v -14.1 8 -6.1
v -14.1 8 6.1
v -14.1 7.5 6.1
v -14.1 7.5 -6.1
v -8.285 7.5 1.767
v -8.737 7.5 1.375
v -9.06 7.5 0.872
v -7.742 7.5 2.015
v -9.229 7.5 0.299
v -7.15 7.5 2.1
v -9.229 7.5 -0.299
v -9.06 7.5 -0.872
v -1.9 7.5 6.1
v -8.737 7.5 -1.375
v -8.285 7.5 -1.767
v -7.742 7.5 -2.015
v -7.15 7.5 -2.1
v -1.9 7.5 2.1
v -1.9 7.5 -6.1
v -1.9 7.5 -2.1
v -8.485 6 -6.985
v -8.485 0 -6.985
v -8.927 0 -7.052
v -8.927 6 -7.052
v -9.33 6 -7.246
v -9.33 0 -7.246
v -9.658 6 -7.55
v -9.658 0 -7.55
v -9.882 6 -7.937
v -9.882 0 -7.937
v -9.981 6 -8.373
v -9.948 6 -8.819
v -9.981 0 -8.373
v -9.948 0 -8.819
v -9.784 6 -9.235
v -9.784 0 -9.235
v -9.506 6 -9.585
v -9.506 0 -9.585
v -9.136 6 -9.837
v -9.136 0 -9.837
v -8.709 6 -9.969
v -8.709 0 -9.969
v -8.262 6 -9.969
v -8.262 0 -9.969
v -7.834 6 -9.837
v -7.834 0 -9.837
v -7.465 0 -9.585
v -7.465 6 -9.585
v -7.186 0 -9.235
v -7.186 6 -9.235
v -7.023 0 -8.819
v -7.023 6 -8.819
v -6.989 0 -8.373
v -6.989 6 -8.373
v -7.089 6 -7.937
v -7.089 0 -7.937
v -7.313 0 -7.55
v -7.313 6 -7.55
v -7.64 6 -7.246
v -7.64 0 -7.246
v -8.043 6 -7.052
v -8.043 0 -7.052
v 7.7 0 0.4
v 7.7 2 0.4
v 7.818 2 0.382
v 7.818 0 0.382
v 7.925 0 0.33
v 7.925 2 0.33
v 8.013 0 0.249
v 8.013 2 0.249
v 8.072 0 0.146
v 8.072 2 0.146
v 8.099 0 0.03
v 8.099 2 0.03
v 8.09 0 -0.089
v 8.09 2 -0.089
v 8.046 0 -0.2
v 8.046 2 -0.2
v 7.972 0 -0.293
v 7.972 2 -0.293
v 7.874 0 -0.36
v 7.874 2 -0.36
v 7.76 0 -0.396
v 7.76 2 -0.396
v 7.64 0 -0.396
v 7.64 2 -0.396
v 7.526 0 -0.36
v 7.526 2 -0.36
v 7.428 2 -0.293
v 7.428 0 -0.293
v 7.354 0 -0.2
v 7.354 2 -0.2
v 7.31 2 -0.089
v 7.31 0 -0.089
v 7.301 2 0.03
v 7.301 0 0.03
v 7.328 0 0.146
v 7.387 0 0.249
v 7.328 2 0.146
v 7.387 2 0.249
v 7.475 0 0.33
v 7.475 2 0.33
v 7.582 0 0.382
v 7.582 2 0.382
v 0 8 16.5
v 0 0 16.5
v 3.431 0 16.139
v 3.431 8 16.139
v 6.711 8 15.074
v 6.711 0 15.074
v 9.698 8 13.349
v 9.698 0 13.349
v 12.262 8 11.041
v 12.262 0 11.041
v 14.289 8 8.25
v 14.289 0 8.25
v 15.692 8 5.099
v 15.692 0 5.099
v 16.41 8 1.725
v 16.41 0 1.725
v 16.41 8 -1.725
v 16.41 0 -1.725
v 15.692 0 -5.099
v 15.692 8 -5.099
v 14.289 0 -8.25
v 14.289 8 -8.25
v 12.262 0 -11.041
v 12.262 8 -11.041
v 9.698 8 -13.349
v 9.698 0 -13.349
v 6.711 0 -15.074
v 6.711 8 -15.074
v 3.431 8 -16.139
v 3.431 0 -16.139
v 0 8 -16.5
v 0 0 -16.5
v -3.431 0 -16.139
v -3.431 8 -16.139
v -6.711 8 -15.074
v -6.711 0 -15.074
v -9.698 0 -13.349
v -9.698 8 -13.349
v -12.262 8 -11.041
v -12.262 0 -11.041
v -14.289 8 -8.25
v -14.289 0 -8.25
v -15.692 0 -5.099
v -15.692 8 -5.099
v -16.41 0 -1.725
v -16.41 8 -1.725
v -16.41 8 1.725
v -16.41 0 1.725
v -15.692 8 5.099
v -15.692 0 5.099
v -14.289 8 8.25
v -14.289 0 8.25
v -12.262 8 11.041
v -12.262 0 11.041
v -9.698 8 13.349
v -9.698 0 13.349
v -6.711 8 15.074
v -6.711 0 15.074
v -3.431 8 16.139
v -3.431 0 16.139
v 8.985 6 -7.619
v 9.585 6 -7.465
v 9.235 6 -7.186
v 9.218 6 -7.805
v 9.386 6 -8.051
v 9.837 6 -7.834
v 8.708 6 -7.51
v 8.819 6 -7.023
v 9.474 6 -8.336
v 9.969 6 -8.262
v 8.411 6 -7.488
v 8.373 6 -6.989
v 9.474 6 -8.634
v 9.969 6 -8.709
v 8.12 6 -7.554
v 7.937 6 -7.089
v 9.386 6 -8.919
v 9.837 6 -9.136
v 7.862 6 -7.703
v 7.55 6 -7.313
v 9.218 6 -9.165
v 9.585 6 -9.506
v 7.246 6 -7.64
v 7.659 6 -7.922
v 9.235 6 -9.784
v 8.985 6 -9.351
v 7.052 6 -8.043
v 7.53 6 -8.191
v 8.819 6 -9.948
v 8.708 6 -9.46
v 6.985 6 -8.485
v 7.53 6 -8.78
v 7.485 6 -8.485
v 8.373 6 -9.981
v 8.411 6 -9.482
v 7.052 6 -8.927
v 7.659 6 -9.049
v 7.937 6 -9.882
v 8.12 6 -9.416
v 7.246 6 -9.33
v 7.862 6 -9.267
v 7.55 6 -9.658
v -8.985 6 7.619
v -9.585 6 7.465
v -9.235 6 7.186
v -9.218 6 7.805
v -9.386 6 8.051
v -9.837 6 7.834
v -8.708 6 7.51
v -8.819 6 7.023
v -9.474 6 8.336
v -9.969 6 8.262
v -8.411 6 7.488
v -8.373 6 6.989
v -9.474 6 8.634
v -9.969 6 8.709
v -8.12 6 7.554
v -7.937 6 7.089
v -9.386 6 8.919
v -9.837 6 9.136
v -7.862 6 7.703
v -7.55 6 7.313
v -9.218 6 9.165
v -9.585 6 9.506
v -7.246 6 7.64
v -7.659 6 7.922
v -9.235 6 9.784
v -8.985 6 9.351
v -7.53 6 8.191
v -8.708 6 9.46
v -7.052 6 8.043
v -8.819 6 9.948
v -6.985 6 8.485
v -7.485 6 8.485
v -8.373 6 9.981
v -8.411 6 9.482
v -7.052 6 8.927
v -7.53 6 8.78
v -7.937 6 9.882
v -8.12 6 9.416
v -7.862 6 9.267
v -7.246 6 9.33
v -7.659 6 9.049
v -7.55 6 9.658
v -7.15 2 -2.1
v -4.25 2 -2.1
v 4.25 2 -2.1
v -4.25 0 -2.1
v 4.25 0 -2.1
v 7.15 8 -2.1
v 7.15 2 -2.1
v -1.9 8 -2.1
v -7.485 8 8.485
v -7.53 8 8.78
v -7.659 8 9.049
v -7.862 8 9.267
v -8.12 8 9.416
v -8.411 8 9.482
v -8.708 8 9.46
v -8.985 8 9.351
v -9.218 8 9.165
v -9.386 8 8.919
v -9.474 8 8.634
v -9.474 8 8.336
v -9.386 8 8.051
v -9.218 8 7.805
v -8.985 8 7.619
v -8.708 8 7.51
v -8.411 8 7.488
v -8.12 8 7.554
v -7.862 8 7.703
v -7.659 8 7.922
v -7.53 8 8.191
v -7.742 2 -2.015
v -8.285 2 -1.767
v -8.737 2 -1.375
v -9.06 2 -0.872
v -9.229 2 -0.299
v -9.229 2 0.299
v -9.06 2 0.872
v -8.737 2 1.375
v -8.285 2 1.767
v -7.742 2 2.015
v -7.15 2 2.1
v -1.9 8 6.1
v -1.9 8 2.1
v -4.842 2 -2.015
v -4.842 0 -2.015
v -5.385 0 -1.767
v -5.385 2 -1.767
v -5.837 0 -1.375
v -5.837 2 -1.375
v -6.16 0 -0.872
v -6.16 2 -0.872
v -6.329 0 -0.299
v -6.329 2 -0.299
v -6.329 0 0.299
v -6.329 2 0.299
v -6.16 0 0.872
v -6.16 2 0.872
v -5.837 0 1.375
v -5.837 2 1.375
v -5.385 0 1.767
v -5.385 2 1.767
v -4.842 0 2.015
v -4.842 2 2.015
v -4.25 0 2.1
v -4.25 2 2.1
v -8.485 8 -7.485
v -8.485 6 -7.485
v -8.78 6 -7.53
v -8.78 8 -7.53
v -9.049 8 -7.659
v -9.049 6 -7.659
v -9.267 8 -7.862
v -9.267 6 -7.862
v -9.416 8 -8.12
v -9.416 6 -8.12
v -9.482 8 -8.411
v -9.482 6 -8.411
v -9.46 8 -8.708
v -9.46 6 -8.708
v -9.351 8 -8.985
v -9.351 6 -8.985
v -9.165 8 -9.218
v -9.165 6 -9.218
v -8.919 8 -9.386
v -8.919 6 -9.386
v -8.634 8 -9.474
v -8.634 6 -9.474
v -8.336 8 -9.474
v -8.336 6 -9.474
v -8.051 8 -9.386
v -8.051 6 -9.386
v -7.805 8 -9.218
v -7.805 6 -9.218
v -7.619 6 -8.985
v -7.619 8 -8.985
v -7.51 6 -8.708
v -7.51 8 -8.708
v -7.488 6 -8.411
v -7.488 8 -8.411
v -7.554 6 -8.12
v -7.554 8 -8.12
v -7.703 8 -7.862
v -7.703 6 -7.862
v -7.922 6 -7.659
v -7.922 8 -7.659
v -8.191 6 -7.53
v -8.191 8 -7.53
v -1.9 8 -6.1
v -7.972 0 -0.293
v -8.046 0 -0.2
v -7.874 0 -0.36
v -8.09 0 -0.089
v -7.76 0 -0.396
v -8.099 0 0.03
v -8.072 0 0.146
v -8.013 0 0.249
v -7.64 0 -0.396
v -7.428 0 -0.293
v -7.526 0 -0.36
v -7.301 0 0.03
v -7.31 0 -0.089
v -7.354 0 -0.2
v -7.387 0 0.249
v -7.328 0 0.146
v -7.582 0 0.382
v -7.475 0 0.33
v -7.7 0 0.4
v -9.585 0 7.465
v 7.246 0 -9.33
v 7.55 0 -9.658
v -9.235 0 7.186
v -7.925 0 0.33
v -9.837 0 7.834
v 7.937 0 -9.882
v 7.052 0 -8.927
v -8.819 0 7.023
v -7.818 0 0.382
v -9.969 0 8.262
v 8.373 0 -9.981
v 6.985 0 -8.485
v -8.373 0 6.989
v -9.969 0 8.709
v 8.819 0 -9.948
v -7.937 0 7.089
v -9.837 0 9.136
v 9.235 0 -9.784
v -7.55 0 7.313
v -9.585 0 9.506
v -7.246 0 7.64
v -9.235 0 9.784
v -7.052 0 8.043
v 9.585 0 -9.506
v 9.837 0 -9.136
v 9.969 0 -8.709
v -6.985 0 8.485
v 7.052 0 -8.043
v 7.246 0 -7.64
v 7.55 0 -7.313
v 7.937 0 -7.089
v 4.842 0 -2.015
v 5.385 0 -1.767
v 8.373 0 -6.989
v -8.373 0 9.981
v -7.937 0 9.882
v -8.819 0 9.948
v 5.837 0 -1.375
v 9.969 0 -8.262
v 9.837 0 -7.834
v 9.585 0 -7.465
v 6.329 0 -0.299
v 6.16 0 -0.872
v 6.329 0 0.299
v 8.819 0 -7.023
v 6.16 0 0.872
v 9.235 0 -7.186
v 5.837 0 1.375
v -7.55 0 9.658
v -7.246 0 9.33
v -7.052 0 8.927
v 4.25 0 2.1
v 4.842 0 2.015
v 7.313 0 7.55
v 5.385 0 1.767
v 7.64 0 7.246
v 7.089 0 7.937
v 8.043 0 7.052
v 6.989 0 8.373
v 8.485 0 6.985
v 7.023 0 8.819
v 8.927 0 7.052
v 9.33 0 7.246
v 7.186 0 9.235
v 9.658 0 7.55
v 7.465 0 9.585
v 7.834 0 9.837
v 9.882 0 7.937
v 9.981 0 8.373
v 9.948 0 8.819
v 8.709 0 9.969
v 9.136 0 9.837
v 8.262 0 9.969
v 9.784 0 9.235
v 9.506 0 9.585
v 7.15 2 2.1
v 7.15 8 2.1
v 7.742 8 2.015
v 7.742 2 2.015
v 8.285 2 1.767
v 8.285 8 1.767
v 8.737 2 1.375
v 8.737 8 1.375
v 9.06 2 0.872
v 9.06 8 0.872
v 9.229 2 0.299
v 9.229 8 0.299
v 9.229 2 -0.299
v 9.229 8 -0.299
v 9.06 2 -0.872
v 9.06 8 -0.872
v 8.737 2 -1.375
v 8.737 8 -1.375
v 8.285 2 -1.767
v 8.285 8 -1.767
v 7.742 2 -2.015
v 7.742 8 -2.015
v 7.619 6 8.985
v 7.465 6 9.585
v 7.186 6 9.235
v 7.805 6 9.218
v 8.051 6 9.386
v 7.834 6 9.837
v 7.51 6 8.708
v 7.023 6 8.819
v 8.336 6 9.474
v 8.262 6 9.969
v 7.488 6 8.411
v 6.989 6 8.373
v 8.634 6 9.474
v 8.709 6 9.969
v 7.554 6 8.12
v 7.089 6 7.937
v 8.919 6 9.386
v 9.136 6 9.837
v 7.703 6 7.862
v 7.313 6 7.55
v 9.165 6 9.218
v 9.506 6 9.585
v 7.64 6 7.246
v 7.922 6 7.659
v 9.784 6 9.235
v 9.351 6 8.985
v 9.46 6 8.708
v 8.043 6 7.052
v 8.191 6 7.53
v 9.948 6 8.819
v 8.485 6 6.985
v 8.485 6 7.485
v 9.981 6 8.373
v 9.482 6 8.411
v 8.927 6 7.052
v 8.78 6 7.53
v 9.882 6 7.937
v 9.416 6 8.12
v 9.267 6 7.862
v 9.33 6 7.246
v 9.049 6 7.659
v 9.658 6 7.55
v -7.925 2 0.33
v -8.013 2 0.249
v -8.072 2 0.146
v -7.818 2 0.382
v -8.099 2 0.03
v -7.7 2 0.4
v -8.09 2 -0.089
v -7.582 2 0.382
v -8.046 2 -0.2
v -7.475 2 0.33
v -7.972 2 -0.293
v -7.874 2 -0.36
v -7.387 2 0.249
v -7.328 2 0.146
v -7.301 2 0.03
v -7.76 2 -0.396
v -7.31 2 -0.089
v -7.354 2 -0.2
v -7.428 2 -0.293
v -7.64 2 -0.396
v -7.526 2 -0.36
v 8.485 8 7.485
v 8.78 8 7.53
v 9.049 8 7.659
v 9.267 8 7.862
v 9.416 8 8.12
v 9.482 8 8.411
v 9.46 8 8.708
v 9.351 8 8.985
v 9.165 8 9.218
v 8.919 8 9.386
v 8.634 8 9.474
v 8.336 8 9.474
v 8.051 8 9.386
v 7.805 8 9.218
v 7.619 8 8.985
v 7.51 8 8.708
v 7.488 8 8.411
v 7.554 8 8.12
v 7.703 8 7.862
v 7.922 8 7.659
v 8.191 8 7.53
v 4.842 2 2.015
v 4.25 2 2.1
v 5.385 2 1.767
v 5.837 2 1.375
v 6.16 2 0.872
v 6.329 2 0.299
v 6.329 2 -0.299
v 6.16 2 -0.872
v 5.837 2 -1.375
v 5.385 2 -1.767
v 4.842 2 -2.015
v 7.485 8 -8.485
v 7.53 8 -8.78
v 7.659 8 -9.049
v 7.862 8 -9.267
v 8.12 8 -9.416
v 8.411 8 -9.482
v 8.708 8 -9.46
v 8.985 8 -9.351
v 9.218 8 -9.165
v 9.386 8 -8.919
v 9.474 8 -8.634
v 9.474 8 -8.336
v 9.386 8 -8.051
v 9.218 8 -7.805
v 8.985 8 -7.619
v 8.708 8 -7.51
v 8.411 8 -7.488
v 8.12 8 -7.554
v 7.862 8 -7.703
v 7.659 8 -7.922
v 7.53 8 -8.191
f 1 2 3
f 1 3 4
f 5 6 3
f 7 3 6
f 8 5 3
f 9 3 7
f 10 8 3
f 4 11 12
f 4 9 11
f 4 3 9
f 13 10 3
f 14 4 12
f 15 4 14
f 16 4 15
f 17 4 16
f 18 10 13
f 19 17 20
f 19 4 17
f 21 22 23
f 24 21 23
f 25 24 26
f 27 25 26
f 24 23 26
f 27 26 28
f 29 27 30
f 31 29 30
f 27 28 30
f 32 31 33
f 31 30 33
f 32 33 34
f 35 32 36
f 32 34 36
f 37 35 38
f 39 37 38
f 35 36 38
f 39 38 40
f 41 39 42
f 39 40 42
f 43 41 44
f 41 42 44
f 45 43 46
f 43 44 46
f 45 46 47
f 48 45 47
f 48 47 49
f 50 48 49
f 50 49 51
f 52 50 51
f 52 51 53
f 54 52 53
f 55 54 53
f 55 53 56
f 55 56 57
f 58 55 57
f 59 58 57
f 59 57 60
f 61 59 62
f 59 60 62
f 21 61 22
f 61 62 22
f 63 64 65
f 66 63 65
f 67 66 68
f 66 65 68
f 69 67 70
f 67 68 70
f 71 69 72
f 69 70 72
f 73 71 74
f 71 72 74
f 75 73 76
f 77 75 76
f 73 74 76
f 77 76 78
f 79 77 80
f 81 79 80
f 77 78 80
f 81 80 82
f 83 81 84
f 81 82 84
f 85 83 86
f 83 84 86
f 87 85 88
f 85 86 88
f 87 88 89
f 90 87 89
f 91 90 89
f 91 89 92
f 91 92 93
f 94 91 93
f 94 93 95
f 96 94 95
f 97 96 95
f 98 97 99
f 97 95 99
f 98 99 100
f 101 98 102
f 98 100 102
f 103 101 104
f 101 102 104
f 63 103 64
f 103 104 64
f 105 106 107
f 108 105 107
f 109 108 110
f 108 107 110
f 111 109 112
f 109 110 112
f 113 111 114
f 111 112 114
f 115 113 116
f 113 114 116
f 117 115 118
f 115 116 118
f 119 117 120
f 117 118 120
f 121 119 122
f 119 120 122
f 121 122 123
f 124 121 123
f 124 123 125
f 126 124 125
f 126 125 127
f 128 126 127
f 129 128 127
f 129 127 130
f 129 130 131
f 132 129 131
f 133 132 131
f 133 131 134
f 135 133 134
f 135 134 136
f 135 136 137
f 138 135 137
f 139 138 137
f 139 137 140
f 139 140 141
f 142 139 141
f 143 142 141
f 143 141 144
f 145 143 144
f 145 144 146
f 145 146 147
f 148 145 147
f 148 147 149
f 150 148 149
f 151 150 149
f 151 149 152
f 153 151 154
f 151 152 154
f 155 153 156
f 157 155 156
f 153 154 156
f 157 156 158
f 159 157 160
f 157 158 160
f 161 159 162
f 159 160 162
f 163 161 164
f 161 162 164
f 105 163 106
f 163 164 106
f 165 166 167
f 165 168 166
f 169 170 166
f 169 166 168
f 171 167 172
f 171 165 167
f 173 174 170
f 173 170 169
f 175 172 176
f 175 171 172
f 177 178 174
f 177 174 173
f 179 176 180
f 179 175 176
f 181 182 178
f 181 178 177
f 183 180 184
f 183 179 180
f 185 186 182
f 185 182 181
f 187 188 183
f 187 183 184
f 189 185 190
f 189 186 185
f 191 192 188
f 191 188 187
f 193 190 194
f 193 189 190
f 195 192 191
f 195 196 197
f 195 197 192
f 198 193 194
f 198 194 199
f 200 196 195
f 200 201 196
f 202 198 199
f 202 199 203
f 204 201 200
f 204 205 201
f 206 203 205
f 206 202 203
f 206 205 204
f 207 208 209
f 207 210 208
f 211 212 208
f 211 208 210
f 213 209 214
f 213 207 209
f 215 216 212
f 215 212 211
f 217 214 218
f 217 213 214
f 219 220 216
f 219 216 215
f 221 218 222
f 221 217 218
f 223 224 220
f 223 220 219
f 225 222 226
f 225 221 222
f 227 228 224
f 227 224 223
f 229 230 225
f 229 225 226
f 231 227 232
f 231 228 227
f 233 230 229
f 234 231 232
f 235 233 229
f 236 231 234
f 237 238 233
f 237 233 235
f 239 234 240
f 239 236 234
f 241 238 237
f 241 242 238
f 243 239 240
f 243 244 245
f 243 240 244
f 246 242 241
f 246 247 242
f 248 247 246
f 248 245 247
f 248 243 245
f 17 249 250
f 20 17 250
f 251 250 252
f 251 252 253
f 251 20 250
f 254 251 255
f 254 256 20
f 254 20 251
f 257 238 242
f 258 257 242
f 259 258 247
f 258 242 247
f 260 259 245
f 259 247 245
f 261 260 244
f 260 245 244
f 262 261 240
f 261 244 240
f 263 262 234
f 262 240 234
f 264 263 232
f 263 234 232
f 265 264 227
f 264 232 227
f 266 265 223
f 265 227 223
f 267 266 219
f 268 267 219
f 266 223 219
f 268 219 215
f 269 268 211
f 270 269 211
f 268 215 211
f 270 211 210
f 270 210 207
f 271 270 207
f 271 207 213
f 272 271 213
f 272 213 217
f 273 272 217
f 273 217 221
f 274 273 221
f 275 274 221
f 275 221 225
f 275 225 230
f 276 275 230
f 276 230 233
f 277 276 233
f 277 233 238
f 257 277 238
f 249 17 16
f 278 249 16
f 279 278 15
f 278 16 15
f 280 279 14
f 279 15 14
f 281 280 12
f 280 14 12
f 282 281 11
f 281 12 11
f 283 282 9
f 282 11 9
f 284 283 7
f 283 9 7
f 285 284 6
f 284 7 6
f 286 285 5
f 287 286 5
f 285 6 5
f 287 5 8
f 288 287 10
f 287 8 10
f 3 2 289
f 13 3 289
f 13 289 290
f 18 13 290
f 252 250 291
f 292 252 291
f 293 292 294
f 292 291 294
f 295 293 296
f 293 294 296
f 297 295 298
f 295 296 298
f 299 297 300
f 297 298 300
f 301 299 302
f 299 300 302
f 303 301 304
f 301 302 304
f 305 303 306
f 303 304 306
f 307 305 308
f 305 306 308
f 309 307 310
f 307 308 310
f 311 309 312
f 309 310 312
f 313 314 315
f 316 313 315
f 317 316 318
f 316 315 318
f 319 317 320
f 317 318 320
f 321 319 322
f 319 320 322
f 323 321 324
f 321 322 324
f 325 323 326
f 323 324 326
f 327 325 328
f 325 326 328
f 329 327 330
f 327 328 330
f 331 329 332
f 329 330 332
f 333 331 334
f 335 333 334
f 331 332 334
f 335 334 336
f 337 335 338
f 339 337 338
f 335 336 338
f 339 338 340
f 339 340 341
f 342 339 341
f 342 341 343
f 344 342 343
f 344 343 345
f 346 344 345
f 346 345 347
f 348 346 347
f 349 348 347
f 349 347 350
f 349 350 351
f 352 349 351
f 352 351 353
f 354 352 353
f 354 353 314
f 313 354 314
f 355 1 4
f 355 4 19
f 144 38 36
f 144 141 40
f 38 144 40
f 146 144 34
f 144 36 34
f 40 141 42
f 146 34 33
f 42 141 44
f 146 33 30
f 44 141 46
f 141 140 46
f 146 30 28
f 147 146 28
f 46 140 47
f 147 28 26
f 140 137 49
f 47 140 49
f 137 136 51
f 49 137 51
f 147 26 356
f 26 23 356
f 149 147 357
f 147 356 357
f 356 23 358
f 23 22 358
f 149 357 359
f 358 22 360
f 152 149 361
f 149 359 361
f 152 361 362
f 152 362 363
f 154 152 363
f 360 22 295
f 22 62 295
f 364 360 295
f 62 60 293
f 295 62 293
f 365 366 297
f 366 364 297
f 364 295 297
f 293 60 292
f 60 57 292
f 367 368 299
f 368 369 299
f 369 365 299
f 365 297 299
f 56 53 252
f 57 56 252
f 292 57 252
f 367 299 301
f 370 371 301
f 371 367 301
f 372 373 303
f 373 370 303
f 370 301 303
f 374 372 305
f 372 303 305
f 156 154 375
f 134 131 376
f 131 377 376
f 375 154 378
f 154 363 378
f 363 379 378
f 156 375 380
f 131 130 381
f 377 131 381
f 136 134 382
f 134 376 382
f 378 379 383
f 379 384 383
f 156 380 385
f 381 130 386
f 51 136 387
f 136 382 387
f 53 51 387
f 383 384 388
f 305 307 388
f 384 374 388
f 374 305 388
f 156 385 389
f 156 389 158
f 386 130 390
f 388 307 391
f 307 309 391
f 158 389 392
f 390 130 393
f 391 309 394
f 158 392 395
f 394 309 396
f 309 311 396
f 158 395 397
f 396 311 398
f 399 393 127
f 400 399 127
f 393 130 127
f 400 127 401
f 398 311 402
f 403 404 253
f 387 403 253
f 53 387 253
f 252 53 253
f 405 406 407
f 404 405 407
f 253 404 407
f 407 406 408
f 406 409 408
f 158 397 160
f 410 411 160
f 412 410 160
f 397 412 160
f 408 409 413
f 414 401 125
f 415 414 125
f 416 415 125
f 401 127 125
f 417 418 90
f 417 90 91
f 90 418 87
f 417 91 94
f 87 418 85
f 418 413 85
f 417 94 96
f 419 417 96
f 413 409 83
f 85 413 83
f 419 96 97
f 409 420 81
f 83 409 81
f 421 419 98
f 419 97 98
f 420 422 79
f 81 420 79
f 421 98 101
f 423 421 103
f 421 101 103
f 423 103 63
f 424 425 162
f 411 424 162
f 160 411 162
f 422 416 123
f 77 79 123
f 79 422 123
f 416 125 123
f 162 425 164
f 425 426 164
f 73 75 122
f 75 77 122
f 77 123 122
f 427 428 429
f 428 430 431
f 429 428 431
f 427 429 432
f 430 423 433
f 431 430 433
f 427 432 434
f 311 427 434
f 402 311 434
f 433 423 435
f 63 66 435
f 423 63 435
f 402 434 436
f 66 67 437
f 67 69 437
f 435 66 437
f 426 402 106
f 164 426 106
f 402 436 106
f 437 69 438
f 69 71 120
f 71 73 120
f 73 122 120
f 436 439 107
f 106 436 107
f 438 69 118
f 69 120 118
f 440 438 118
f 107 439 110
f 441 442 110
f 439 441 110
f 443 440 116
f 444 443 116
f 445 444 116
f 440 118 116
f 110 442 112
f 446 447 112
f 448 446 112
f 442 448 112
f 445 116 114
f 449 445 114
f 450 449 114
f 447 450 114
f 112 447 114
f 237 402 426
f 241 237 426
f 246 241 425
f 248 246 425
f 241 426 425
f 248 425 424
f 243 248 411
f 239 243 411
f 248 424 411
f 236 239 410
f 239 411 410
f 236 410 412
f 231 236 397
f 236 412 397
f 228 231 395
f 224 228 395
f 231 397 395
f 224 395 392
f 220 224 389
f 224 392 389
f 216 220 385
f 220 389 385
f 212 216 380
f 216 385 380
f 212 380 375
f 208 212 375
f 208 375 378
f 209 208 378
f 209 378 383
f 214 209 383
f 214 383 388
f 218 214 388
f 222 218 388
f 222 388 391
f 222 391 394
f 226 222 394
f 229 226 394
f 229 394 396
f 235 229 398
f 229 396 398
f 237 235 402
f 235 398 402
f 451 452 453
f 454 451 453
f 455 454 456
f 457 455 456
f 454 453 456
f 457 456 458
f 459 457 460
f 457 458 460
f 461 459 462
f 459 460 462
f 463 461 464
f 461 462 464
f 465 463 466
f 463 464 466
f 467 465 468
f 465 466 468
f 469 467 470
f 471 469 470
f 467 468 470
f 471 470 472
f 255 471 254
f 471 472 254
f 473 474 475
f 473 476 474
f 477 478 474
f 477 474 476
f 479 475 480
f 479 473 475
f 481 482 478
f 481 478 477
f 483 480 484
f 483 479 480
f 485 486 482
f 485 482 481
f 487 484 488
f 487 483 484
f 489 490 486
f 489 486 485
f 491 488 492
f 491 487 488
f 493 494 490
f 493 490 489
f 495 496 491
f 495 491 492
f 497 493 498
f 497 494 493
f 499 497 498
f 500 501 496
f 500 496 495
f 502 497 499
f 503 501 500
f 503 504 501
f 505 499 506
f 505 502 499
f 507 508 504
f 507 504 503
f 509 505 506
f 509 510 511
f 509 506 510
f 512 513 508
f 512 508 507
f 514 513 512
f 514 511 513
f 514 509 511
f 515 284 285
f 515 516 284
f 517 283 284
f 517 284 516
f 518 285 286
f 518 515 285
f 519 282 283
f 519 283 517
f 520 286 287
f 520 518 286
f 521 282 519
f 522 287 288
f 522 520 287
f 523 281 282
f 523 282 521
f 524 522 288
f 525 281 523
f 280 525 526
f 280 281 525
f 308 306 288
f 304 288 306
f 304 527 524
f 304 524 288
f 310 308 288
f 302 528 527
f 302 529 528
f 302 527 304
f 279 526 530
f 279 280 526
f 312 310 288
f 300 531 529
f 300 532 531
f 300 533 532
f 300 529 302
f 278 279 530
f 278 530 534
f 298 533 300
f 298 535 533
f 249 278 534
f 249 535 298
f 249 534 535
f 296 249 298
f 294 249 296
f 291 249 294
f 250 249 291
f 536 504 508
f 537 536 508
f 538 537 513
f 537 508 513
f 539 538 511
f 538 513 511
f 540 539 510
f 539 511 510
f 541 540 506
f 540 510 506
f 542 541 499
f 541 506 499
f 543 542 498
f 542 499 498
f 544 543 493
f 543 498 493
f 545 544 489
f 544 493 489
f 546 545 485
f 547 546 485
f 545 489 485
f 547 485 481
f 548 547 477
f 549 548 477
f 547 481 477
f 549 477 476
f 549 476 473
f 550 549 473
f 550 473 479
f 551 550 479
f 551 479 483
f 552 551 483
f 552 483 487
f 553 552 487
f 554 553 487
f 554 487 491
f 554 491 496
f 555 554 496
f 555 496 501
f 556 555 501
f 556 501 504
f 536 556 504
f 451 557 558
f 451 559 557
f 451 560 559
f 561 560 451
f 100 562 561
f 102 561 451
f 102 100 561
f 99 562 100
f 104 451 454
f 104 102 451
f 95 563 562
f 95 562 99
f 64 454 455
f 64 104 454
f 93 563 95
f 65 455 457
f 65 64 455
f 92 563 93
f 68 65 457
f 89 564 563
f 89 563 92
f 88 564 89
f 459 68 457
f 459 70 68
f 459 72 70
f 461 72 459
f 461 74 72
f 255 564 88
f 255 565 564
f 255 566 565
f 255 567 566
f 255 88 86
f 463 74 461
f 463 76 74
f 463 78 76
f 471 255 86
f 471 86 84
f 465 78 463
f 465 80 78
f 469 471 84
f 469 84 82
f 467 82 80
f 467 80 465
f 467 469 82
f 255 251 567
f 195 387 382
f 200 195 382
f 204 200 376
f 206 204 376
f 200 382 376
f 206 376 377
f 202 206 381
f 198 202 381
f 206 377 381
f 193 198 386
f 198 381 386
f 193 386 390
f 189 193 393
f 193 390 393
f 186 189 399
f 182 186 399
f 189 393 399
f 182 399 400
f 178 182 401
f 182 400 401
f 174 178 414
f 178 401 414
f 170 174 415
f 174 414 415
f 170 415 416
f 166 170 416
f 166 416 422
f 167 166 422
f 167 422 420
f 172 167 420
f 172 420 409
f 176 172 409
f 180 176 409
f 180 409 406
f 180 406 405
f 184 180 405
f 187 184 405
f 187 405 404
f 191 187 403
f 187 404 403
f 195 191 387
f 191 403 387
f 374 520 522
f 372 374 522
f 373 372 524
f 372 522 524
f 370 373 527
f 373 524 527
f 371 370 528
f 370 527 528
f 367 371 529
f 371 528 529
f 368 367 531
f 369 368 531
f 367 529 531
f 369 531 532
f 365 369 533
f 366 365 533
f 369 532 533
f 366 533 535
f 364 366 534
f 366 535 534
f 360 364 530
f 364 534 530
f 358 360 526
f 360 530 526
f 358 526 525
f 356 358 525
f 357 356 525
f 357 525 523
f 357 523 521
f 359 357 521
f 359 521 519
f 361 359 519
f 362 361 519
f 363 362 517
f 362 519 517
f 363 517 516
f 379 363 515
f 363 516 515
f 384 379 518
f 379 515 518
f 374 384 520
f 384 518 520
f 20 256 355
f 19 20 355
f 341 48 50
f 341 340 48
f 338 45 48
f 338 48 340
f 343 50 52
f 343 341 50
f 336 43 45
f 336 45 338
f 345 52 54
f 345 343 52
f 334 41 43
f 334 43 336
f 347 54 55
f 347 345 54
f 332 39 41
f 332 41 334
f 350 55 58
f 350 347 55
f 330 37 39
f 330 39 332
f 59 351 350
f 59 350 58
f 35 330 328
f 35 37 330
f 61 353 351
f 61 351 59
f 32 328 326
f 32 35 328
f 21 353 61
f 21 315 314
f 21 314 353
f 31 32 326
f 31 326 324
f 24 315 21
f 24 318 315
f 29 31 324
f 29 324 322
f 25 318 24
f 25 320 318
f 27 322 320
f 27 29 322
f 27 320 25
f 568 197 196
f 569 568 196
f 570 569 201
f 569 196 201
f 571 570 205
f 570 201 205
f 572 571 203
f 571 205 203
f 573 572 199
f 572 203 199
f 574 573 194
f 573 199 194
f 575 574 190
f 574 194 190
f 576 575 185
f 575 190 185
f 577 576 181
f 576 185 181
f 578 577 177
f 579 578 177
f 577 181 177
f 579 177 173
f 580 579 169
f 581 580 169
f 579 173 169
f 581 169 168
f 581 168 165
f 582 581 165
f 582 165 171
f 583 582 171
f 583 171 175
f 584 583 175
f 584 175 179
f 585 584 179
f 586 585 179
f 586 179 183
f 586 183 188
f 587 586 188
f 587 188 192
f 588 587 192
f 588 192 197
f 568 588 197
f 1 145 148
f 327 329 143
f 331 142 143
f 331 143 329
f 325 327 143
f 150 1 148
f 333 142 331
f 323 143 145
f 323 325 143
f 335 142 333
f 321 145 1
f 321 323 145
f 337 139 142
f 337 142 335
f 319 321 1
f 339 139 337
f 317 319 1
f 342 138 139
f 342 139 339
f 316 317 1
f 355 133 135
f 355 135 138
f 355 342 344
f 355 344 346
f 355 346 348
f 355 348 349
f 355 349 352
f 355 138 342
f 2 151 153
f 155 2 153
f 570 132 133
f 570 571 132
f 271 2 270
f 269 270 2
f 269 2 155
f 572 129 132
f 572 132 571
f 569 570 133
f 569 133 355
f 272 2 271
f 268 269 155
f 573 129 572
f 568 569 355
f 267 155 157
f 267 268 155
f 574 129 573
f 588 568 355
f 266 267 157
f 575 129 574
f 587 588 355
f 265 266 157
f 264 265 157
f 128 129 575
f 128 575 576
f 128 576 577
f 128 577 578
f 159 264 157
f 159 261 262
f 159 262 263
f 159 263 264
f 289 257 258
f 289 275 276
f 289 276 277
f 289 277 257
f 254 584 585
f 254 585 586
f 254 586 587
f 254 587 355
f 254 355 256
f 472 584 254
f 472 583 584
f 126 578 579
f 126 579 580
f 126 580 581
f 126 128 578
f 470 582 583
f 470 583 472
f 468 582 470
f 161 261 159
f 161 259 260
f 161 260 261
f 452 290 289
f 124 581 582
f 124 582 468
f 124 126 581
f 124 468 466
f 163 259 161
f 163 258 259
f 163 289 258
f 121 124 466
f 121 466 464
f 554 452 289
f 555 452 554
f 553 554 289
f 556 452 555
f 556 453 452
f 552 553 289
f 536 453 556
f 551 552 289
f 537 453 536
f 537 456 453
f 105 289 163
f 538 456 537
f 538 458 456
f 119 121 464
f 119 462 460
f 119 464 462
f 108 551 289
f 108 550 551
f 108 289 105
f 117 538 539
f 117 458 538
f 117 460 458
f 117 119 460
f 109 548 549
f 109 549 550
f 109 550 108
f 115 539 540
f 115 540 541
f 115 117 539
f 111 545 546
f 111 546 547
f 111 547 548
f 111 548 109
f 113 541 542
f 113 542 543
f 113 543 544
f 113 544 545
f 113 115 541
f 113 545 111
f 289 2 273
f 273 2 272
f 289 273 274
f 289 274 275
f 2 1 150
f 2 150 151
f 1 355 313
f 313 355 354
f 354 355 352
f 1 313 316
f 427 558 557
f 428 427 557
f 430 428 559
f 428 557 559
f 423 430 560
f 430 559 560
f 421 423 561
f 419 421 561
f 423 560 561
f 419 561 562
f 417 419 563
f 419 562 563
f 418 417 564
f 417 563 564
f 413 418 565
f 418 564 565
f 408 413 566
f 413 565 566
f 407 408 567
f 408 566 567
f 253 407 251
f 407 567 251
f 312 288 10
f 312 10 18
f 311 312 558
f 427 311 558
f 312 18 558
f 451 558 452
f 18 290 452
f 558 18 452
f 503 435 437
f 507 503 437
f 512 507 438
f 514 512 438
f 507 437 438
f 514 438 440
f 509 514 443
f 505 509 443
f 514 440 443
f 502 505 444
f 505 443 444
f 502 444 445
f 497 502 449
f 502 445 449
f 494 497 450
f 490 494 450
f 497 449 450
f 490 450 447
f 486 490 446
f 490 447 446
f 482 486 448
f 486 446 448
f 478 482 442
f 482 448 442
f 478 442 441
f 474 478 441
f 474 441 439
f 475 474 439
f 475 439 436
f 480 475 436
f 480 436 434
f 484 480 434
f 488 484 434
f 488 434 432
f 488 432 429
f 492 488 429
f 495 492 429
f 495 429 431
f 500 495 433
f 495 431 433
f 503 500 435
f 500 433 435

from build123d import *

# Parameters (mm, degrees)
SKETCH_1_R               = 16.5
EXTRUDE_1_DEPTH          = 8
SKETCH_1_5_R             = 16.5
SKETCH_1_5_R_2           = 15.5
EXTRUDE_2_DEPTH          = 6
SKETCH_2_R               = 2.1
SKETCH_2_W               = 8.5
SKETCH_2_H               = 4.2
CUT_EXTRUDE_1_DEPTH      = 25.667792767
SKETCH_3_R               = 2.1
SKETCH_3_W               = 14.3
SKETCH_3_H               = 4.2
CUT_EXTRUDE_2_DEPTH      = 6
SKETCH_4_R               = 0.4
CUT_EXTRUDE_3_DEPTH      = 2
SKETCH_5_W               = 12.2
SKETCH_5_H               = 12.2
SKETCH_5_W_2             = 7
SKETCH_5_H_2             = 3.2
CUT_EXTRUDE_4_DEPTH      = 0.5
SKETCH_6_R               = 1
CUT_EXTRUDE_5_DEPTH      = 25.667792767
SKETCH_6_3_R             = 1.5
CUT_EXTRUDE_6_DEPTH      = 6
PATTERN_CIRCULAR_1_COUNT = 4


with BuildPart() as part:
    # 草图1 → 凸台-拉伸1 (new body)
    with BuildSketch(Plane(origin=(0, 0, 0), x_dir=(1, 0, 0), z_dir=(0, 1, 0))):
        with Locations(Location((0, 0, 0), (0, 0, 270))):
            Circle(SKETCH_1_R)
    extrude(amount=EXTRUDE_1_DEPTH)

    # 草图1<5> → 凸台-拉伸2 (add)
    with BuildSketch(Plane(origin=(0, 0, 0), x_dir=(1, 0, 0), z_dir=(0, 1, 0))):
        with Locations(Location((0, 0, 0), (0, 0, 270))):
            Circle(SKETCH_1_5_R)
        Circle(SKETCH_1_5_R_2, mode=Mode.SUBTRACT)
    extrude(amount=EXTRUDE_2_DEPTH)

    # 草图2 → 切除-拉伸1 (cut, through all)
    with BuildSketch(Plane(origin=(0, 8, 0), x_dir=(1, 0, 0), z_dir=(0, 1, 0))):
        with Locations((4.25, 0)):
            Circle(SKETCH_2_R)
        with Locations((-4.25, 0)):
            Circle(SKETCH_2_R)
        Rectangle(SKETCH_2_W, SKETCH_2_H)
    extrude(amount=-CUT_EXTRUDE_1_DEPTH, mode=Mode.SUBTRACT)

    # 草图3 → 切除-拉伸2 (cut)
    with BuildSketch(Plane(origin=(0, 8, 0), x_dir=(1, 0, 0), z_dir=(0, 1, 0))):
        with Locations((-7.15, 0)):
            Circle(SKETCH_3_R)
        with Locations((7.15, 0)):
            Circle(SKETCH_3_R)
        Rectangle(SKETCH_3_W, SKETCH_3_H)
    extrude(amount=-CUT_EXTRUDE_2_DEPTH, mode=Mode.SUBTRACT)

    # 草图4 → 切除-拉伸3 (cut)
    with BuildSketch(Plane(origin=(0, 2, 0), x_dir=(1, 0, 0), z_dir=(0, 1, 0))):
        with Locations(Location((-7.7, 0, 0), (0, 0, 270))):
            Circle(SKETCH_4_R)
        with Locations(Location((7.7, 0, 0), (0, 0, 270))):
            Circle(SKETCH_4_R)
    extrude(amount=-CUT_EXTRUDE_3_DEPTH, mode=Mode.SUBTRACT)

    # 草图5 → 切除-拉伸4 (cut)
    with BuildSketch(Plane(origin=(0, 8, 0), x_dir=(1, 0, 0), z_dir=(0, 1, 0))):
        with Locations((-8, 0)):
            Rectangle(SKETCH_5_W, SKETCH_5_H)
        with Locations((1.6, 0)):
            Rectangle(SKETCH_5_W_2, SKETCH_5_H_2)
    extrude(amount=-CUT_EXTRUDE_4_DEPTH, mode=Mode.SUBTRACT)

    # 草图6 → 切除-拉伸5 (cut, through all)
    with BuildSketch(Plane.XZ):
        with Locations(Location((8.485281374, 8.485281374, 0), (0, 0, 270))):
            Circle(SKETCH_6_R)
    cut_extrude_5 = extrude(amount=-CUT_EXTRUDE_5_DEPTH, mode=Mode.SUBTRACT)

    # 草图6<3> → 切除-拉伸6 (cut)
    with BuildSketch(Plane.XZ):
        with Locations(Location((8.485281374, 8.485281374, 0), (0, 0, 270))):
            Circle(SKETCH_6_3_R)
    cut_extrude_6 = extrude(amount=-CUT_EXTRUDE_6_DEPTH, mode=Mode.SUBTRACT)

    # 阵列(圆周)1: 切除-拉伸5, 切除-拉伸6 ×4 about axis
    pattern_circular_1_axis = Axis((0, 0, 0), (0, 1, 0))
    add([cut_extrude_5.rotate(pattern_circular_1_axis, i * 360 / PATTERN_CIRCULAR_1_COUNT) for i in range(1, PATTERN_CIRCULAR_1_COUNT)], mode=Mode.SUBTRACT)
    add([cut_extrude_6.rotate(pattern_circular_1_axis, i * 360 / PATTERN_CIRCULAR_1_COUNT) for i in range(1, PATTERN_CIRCULAR_1_COUNT)], mode=Mode.SUBTRACT)


solid = part.part
